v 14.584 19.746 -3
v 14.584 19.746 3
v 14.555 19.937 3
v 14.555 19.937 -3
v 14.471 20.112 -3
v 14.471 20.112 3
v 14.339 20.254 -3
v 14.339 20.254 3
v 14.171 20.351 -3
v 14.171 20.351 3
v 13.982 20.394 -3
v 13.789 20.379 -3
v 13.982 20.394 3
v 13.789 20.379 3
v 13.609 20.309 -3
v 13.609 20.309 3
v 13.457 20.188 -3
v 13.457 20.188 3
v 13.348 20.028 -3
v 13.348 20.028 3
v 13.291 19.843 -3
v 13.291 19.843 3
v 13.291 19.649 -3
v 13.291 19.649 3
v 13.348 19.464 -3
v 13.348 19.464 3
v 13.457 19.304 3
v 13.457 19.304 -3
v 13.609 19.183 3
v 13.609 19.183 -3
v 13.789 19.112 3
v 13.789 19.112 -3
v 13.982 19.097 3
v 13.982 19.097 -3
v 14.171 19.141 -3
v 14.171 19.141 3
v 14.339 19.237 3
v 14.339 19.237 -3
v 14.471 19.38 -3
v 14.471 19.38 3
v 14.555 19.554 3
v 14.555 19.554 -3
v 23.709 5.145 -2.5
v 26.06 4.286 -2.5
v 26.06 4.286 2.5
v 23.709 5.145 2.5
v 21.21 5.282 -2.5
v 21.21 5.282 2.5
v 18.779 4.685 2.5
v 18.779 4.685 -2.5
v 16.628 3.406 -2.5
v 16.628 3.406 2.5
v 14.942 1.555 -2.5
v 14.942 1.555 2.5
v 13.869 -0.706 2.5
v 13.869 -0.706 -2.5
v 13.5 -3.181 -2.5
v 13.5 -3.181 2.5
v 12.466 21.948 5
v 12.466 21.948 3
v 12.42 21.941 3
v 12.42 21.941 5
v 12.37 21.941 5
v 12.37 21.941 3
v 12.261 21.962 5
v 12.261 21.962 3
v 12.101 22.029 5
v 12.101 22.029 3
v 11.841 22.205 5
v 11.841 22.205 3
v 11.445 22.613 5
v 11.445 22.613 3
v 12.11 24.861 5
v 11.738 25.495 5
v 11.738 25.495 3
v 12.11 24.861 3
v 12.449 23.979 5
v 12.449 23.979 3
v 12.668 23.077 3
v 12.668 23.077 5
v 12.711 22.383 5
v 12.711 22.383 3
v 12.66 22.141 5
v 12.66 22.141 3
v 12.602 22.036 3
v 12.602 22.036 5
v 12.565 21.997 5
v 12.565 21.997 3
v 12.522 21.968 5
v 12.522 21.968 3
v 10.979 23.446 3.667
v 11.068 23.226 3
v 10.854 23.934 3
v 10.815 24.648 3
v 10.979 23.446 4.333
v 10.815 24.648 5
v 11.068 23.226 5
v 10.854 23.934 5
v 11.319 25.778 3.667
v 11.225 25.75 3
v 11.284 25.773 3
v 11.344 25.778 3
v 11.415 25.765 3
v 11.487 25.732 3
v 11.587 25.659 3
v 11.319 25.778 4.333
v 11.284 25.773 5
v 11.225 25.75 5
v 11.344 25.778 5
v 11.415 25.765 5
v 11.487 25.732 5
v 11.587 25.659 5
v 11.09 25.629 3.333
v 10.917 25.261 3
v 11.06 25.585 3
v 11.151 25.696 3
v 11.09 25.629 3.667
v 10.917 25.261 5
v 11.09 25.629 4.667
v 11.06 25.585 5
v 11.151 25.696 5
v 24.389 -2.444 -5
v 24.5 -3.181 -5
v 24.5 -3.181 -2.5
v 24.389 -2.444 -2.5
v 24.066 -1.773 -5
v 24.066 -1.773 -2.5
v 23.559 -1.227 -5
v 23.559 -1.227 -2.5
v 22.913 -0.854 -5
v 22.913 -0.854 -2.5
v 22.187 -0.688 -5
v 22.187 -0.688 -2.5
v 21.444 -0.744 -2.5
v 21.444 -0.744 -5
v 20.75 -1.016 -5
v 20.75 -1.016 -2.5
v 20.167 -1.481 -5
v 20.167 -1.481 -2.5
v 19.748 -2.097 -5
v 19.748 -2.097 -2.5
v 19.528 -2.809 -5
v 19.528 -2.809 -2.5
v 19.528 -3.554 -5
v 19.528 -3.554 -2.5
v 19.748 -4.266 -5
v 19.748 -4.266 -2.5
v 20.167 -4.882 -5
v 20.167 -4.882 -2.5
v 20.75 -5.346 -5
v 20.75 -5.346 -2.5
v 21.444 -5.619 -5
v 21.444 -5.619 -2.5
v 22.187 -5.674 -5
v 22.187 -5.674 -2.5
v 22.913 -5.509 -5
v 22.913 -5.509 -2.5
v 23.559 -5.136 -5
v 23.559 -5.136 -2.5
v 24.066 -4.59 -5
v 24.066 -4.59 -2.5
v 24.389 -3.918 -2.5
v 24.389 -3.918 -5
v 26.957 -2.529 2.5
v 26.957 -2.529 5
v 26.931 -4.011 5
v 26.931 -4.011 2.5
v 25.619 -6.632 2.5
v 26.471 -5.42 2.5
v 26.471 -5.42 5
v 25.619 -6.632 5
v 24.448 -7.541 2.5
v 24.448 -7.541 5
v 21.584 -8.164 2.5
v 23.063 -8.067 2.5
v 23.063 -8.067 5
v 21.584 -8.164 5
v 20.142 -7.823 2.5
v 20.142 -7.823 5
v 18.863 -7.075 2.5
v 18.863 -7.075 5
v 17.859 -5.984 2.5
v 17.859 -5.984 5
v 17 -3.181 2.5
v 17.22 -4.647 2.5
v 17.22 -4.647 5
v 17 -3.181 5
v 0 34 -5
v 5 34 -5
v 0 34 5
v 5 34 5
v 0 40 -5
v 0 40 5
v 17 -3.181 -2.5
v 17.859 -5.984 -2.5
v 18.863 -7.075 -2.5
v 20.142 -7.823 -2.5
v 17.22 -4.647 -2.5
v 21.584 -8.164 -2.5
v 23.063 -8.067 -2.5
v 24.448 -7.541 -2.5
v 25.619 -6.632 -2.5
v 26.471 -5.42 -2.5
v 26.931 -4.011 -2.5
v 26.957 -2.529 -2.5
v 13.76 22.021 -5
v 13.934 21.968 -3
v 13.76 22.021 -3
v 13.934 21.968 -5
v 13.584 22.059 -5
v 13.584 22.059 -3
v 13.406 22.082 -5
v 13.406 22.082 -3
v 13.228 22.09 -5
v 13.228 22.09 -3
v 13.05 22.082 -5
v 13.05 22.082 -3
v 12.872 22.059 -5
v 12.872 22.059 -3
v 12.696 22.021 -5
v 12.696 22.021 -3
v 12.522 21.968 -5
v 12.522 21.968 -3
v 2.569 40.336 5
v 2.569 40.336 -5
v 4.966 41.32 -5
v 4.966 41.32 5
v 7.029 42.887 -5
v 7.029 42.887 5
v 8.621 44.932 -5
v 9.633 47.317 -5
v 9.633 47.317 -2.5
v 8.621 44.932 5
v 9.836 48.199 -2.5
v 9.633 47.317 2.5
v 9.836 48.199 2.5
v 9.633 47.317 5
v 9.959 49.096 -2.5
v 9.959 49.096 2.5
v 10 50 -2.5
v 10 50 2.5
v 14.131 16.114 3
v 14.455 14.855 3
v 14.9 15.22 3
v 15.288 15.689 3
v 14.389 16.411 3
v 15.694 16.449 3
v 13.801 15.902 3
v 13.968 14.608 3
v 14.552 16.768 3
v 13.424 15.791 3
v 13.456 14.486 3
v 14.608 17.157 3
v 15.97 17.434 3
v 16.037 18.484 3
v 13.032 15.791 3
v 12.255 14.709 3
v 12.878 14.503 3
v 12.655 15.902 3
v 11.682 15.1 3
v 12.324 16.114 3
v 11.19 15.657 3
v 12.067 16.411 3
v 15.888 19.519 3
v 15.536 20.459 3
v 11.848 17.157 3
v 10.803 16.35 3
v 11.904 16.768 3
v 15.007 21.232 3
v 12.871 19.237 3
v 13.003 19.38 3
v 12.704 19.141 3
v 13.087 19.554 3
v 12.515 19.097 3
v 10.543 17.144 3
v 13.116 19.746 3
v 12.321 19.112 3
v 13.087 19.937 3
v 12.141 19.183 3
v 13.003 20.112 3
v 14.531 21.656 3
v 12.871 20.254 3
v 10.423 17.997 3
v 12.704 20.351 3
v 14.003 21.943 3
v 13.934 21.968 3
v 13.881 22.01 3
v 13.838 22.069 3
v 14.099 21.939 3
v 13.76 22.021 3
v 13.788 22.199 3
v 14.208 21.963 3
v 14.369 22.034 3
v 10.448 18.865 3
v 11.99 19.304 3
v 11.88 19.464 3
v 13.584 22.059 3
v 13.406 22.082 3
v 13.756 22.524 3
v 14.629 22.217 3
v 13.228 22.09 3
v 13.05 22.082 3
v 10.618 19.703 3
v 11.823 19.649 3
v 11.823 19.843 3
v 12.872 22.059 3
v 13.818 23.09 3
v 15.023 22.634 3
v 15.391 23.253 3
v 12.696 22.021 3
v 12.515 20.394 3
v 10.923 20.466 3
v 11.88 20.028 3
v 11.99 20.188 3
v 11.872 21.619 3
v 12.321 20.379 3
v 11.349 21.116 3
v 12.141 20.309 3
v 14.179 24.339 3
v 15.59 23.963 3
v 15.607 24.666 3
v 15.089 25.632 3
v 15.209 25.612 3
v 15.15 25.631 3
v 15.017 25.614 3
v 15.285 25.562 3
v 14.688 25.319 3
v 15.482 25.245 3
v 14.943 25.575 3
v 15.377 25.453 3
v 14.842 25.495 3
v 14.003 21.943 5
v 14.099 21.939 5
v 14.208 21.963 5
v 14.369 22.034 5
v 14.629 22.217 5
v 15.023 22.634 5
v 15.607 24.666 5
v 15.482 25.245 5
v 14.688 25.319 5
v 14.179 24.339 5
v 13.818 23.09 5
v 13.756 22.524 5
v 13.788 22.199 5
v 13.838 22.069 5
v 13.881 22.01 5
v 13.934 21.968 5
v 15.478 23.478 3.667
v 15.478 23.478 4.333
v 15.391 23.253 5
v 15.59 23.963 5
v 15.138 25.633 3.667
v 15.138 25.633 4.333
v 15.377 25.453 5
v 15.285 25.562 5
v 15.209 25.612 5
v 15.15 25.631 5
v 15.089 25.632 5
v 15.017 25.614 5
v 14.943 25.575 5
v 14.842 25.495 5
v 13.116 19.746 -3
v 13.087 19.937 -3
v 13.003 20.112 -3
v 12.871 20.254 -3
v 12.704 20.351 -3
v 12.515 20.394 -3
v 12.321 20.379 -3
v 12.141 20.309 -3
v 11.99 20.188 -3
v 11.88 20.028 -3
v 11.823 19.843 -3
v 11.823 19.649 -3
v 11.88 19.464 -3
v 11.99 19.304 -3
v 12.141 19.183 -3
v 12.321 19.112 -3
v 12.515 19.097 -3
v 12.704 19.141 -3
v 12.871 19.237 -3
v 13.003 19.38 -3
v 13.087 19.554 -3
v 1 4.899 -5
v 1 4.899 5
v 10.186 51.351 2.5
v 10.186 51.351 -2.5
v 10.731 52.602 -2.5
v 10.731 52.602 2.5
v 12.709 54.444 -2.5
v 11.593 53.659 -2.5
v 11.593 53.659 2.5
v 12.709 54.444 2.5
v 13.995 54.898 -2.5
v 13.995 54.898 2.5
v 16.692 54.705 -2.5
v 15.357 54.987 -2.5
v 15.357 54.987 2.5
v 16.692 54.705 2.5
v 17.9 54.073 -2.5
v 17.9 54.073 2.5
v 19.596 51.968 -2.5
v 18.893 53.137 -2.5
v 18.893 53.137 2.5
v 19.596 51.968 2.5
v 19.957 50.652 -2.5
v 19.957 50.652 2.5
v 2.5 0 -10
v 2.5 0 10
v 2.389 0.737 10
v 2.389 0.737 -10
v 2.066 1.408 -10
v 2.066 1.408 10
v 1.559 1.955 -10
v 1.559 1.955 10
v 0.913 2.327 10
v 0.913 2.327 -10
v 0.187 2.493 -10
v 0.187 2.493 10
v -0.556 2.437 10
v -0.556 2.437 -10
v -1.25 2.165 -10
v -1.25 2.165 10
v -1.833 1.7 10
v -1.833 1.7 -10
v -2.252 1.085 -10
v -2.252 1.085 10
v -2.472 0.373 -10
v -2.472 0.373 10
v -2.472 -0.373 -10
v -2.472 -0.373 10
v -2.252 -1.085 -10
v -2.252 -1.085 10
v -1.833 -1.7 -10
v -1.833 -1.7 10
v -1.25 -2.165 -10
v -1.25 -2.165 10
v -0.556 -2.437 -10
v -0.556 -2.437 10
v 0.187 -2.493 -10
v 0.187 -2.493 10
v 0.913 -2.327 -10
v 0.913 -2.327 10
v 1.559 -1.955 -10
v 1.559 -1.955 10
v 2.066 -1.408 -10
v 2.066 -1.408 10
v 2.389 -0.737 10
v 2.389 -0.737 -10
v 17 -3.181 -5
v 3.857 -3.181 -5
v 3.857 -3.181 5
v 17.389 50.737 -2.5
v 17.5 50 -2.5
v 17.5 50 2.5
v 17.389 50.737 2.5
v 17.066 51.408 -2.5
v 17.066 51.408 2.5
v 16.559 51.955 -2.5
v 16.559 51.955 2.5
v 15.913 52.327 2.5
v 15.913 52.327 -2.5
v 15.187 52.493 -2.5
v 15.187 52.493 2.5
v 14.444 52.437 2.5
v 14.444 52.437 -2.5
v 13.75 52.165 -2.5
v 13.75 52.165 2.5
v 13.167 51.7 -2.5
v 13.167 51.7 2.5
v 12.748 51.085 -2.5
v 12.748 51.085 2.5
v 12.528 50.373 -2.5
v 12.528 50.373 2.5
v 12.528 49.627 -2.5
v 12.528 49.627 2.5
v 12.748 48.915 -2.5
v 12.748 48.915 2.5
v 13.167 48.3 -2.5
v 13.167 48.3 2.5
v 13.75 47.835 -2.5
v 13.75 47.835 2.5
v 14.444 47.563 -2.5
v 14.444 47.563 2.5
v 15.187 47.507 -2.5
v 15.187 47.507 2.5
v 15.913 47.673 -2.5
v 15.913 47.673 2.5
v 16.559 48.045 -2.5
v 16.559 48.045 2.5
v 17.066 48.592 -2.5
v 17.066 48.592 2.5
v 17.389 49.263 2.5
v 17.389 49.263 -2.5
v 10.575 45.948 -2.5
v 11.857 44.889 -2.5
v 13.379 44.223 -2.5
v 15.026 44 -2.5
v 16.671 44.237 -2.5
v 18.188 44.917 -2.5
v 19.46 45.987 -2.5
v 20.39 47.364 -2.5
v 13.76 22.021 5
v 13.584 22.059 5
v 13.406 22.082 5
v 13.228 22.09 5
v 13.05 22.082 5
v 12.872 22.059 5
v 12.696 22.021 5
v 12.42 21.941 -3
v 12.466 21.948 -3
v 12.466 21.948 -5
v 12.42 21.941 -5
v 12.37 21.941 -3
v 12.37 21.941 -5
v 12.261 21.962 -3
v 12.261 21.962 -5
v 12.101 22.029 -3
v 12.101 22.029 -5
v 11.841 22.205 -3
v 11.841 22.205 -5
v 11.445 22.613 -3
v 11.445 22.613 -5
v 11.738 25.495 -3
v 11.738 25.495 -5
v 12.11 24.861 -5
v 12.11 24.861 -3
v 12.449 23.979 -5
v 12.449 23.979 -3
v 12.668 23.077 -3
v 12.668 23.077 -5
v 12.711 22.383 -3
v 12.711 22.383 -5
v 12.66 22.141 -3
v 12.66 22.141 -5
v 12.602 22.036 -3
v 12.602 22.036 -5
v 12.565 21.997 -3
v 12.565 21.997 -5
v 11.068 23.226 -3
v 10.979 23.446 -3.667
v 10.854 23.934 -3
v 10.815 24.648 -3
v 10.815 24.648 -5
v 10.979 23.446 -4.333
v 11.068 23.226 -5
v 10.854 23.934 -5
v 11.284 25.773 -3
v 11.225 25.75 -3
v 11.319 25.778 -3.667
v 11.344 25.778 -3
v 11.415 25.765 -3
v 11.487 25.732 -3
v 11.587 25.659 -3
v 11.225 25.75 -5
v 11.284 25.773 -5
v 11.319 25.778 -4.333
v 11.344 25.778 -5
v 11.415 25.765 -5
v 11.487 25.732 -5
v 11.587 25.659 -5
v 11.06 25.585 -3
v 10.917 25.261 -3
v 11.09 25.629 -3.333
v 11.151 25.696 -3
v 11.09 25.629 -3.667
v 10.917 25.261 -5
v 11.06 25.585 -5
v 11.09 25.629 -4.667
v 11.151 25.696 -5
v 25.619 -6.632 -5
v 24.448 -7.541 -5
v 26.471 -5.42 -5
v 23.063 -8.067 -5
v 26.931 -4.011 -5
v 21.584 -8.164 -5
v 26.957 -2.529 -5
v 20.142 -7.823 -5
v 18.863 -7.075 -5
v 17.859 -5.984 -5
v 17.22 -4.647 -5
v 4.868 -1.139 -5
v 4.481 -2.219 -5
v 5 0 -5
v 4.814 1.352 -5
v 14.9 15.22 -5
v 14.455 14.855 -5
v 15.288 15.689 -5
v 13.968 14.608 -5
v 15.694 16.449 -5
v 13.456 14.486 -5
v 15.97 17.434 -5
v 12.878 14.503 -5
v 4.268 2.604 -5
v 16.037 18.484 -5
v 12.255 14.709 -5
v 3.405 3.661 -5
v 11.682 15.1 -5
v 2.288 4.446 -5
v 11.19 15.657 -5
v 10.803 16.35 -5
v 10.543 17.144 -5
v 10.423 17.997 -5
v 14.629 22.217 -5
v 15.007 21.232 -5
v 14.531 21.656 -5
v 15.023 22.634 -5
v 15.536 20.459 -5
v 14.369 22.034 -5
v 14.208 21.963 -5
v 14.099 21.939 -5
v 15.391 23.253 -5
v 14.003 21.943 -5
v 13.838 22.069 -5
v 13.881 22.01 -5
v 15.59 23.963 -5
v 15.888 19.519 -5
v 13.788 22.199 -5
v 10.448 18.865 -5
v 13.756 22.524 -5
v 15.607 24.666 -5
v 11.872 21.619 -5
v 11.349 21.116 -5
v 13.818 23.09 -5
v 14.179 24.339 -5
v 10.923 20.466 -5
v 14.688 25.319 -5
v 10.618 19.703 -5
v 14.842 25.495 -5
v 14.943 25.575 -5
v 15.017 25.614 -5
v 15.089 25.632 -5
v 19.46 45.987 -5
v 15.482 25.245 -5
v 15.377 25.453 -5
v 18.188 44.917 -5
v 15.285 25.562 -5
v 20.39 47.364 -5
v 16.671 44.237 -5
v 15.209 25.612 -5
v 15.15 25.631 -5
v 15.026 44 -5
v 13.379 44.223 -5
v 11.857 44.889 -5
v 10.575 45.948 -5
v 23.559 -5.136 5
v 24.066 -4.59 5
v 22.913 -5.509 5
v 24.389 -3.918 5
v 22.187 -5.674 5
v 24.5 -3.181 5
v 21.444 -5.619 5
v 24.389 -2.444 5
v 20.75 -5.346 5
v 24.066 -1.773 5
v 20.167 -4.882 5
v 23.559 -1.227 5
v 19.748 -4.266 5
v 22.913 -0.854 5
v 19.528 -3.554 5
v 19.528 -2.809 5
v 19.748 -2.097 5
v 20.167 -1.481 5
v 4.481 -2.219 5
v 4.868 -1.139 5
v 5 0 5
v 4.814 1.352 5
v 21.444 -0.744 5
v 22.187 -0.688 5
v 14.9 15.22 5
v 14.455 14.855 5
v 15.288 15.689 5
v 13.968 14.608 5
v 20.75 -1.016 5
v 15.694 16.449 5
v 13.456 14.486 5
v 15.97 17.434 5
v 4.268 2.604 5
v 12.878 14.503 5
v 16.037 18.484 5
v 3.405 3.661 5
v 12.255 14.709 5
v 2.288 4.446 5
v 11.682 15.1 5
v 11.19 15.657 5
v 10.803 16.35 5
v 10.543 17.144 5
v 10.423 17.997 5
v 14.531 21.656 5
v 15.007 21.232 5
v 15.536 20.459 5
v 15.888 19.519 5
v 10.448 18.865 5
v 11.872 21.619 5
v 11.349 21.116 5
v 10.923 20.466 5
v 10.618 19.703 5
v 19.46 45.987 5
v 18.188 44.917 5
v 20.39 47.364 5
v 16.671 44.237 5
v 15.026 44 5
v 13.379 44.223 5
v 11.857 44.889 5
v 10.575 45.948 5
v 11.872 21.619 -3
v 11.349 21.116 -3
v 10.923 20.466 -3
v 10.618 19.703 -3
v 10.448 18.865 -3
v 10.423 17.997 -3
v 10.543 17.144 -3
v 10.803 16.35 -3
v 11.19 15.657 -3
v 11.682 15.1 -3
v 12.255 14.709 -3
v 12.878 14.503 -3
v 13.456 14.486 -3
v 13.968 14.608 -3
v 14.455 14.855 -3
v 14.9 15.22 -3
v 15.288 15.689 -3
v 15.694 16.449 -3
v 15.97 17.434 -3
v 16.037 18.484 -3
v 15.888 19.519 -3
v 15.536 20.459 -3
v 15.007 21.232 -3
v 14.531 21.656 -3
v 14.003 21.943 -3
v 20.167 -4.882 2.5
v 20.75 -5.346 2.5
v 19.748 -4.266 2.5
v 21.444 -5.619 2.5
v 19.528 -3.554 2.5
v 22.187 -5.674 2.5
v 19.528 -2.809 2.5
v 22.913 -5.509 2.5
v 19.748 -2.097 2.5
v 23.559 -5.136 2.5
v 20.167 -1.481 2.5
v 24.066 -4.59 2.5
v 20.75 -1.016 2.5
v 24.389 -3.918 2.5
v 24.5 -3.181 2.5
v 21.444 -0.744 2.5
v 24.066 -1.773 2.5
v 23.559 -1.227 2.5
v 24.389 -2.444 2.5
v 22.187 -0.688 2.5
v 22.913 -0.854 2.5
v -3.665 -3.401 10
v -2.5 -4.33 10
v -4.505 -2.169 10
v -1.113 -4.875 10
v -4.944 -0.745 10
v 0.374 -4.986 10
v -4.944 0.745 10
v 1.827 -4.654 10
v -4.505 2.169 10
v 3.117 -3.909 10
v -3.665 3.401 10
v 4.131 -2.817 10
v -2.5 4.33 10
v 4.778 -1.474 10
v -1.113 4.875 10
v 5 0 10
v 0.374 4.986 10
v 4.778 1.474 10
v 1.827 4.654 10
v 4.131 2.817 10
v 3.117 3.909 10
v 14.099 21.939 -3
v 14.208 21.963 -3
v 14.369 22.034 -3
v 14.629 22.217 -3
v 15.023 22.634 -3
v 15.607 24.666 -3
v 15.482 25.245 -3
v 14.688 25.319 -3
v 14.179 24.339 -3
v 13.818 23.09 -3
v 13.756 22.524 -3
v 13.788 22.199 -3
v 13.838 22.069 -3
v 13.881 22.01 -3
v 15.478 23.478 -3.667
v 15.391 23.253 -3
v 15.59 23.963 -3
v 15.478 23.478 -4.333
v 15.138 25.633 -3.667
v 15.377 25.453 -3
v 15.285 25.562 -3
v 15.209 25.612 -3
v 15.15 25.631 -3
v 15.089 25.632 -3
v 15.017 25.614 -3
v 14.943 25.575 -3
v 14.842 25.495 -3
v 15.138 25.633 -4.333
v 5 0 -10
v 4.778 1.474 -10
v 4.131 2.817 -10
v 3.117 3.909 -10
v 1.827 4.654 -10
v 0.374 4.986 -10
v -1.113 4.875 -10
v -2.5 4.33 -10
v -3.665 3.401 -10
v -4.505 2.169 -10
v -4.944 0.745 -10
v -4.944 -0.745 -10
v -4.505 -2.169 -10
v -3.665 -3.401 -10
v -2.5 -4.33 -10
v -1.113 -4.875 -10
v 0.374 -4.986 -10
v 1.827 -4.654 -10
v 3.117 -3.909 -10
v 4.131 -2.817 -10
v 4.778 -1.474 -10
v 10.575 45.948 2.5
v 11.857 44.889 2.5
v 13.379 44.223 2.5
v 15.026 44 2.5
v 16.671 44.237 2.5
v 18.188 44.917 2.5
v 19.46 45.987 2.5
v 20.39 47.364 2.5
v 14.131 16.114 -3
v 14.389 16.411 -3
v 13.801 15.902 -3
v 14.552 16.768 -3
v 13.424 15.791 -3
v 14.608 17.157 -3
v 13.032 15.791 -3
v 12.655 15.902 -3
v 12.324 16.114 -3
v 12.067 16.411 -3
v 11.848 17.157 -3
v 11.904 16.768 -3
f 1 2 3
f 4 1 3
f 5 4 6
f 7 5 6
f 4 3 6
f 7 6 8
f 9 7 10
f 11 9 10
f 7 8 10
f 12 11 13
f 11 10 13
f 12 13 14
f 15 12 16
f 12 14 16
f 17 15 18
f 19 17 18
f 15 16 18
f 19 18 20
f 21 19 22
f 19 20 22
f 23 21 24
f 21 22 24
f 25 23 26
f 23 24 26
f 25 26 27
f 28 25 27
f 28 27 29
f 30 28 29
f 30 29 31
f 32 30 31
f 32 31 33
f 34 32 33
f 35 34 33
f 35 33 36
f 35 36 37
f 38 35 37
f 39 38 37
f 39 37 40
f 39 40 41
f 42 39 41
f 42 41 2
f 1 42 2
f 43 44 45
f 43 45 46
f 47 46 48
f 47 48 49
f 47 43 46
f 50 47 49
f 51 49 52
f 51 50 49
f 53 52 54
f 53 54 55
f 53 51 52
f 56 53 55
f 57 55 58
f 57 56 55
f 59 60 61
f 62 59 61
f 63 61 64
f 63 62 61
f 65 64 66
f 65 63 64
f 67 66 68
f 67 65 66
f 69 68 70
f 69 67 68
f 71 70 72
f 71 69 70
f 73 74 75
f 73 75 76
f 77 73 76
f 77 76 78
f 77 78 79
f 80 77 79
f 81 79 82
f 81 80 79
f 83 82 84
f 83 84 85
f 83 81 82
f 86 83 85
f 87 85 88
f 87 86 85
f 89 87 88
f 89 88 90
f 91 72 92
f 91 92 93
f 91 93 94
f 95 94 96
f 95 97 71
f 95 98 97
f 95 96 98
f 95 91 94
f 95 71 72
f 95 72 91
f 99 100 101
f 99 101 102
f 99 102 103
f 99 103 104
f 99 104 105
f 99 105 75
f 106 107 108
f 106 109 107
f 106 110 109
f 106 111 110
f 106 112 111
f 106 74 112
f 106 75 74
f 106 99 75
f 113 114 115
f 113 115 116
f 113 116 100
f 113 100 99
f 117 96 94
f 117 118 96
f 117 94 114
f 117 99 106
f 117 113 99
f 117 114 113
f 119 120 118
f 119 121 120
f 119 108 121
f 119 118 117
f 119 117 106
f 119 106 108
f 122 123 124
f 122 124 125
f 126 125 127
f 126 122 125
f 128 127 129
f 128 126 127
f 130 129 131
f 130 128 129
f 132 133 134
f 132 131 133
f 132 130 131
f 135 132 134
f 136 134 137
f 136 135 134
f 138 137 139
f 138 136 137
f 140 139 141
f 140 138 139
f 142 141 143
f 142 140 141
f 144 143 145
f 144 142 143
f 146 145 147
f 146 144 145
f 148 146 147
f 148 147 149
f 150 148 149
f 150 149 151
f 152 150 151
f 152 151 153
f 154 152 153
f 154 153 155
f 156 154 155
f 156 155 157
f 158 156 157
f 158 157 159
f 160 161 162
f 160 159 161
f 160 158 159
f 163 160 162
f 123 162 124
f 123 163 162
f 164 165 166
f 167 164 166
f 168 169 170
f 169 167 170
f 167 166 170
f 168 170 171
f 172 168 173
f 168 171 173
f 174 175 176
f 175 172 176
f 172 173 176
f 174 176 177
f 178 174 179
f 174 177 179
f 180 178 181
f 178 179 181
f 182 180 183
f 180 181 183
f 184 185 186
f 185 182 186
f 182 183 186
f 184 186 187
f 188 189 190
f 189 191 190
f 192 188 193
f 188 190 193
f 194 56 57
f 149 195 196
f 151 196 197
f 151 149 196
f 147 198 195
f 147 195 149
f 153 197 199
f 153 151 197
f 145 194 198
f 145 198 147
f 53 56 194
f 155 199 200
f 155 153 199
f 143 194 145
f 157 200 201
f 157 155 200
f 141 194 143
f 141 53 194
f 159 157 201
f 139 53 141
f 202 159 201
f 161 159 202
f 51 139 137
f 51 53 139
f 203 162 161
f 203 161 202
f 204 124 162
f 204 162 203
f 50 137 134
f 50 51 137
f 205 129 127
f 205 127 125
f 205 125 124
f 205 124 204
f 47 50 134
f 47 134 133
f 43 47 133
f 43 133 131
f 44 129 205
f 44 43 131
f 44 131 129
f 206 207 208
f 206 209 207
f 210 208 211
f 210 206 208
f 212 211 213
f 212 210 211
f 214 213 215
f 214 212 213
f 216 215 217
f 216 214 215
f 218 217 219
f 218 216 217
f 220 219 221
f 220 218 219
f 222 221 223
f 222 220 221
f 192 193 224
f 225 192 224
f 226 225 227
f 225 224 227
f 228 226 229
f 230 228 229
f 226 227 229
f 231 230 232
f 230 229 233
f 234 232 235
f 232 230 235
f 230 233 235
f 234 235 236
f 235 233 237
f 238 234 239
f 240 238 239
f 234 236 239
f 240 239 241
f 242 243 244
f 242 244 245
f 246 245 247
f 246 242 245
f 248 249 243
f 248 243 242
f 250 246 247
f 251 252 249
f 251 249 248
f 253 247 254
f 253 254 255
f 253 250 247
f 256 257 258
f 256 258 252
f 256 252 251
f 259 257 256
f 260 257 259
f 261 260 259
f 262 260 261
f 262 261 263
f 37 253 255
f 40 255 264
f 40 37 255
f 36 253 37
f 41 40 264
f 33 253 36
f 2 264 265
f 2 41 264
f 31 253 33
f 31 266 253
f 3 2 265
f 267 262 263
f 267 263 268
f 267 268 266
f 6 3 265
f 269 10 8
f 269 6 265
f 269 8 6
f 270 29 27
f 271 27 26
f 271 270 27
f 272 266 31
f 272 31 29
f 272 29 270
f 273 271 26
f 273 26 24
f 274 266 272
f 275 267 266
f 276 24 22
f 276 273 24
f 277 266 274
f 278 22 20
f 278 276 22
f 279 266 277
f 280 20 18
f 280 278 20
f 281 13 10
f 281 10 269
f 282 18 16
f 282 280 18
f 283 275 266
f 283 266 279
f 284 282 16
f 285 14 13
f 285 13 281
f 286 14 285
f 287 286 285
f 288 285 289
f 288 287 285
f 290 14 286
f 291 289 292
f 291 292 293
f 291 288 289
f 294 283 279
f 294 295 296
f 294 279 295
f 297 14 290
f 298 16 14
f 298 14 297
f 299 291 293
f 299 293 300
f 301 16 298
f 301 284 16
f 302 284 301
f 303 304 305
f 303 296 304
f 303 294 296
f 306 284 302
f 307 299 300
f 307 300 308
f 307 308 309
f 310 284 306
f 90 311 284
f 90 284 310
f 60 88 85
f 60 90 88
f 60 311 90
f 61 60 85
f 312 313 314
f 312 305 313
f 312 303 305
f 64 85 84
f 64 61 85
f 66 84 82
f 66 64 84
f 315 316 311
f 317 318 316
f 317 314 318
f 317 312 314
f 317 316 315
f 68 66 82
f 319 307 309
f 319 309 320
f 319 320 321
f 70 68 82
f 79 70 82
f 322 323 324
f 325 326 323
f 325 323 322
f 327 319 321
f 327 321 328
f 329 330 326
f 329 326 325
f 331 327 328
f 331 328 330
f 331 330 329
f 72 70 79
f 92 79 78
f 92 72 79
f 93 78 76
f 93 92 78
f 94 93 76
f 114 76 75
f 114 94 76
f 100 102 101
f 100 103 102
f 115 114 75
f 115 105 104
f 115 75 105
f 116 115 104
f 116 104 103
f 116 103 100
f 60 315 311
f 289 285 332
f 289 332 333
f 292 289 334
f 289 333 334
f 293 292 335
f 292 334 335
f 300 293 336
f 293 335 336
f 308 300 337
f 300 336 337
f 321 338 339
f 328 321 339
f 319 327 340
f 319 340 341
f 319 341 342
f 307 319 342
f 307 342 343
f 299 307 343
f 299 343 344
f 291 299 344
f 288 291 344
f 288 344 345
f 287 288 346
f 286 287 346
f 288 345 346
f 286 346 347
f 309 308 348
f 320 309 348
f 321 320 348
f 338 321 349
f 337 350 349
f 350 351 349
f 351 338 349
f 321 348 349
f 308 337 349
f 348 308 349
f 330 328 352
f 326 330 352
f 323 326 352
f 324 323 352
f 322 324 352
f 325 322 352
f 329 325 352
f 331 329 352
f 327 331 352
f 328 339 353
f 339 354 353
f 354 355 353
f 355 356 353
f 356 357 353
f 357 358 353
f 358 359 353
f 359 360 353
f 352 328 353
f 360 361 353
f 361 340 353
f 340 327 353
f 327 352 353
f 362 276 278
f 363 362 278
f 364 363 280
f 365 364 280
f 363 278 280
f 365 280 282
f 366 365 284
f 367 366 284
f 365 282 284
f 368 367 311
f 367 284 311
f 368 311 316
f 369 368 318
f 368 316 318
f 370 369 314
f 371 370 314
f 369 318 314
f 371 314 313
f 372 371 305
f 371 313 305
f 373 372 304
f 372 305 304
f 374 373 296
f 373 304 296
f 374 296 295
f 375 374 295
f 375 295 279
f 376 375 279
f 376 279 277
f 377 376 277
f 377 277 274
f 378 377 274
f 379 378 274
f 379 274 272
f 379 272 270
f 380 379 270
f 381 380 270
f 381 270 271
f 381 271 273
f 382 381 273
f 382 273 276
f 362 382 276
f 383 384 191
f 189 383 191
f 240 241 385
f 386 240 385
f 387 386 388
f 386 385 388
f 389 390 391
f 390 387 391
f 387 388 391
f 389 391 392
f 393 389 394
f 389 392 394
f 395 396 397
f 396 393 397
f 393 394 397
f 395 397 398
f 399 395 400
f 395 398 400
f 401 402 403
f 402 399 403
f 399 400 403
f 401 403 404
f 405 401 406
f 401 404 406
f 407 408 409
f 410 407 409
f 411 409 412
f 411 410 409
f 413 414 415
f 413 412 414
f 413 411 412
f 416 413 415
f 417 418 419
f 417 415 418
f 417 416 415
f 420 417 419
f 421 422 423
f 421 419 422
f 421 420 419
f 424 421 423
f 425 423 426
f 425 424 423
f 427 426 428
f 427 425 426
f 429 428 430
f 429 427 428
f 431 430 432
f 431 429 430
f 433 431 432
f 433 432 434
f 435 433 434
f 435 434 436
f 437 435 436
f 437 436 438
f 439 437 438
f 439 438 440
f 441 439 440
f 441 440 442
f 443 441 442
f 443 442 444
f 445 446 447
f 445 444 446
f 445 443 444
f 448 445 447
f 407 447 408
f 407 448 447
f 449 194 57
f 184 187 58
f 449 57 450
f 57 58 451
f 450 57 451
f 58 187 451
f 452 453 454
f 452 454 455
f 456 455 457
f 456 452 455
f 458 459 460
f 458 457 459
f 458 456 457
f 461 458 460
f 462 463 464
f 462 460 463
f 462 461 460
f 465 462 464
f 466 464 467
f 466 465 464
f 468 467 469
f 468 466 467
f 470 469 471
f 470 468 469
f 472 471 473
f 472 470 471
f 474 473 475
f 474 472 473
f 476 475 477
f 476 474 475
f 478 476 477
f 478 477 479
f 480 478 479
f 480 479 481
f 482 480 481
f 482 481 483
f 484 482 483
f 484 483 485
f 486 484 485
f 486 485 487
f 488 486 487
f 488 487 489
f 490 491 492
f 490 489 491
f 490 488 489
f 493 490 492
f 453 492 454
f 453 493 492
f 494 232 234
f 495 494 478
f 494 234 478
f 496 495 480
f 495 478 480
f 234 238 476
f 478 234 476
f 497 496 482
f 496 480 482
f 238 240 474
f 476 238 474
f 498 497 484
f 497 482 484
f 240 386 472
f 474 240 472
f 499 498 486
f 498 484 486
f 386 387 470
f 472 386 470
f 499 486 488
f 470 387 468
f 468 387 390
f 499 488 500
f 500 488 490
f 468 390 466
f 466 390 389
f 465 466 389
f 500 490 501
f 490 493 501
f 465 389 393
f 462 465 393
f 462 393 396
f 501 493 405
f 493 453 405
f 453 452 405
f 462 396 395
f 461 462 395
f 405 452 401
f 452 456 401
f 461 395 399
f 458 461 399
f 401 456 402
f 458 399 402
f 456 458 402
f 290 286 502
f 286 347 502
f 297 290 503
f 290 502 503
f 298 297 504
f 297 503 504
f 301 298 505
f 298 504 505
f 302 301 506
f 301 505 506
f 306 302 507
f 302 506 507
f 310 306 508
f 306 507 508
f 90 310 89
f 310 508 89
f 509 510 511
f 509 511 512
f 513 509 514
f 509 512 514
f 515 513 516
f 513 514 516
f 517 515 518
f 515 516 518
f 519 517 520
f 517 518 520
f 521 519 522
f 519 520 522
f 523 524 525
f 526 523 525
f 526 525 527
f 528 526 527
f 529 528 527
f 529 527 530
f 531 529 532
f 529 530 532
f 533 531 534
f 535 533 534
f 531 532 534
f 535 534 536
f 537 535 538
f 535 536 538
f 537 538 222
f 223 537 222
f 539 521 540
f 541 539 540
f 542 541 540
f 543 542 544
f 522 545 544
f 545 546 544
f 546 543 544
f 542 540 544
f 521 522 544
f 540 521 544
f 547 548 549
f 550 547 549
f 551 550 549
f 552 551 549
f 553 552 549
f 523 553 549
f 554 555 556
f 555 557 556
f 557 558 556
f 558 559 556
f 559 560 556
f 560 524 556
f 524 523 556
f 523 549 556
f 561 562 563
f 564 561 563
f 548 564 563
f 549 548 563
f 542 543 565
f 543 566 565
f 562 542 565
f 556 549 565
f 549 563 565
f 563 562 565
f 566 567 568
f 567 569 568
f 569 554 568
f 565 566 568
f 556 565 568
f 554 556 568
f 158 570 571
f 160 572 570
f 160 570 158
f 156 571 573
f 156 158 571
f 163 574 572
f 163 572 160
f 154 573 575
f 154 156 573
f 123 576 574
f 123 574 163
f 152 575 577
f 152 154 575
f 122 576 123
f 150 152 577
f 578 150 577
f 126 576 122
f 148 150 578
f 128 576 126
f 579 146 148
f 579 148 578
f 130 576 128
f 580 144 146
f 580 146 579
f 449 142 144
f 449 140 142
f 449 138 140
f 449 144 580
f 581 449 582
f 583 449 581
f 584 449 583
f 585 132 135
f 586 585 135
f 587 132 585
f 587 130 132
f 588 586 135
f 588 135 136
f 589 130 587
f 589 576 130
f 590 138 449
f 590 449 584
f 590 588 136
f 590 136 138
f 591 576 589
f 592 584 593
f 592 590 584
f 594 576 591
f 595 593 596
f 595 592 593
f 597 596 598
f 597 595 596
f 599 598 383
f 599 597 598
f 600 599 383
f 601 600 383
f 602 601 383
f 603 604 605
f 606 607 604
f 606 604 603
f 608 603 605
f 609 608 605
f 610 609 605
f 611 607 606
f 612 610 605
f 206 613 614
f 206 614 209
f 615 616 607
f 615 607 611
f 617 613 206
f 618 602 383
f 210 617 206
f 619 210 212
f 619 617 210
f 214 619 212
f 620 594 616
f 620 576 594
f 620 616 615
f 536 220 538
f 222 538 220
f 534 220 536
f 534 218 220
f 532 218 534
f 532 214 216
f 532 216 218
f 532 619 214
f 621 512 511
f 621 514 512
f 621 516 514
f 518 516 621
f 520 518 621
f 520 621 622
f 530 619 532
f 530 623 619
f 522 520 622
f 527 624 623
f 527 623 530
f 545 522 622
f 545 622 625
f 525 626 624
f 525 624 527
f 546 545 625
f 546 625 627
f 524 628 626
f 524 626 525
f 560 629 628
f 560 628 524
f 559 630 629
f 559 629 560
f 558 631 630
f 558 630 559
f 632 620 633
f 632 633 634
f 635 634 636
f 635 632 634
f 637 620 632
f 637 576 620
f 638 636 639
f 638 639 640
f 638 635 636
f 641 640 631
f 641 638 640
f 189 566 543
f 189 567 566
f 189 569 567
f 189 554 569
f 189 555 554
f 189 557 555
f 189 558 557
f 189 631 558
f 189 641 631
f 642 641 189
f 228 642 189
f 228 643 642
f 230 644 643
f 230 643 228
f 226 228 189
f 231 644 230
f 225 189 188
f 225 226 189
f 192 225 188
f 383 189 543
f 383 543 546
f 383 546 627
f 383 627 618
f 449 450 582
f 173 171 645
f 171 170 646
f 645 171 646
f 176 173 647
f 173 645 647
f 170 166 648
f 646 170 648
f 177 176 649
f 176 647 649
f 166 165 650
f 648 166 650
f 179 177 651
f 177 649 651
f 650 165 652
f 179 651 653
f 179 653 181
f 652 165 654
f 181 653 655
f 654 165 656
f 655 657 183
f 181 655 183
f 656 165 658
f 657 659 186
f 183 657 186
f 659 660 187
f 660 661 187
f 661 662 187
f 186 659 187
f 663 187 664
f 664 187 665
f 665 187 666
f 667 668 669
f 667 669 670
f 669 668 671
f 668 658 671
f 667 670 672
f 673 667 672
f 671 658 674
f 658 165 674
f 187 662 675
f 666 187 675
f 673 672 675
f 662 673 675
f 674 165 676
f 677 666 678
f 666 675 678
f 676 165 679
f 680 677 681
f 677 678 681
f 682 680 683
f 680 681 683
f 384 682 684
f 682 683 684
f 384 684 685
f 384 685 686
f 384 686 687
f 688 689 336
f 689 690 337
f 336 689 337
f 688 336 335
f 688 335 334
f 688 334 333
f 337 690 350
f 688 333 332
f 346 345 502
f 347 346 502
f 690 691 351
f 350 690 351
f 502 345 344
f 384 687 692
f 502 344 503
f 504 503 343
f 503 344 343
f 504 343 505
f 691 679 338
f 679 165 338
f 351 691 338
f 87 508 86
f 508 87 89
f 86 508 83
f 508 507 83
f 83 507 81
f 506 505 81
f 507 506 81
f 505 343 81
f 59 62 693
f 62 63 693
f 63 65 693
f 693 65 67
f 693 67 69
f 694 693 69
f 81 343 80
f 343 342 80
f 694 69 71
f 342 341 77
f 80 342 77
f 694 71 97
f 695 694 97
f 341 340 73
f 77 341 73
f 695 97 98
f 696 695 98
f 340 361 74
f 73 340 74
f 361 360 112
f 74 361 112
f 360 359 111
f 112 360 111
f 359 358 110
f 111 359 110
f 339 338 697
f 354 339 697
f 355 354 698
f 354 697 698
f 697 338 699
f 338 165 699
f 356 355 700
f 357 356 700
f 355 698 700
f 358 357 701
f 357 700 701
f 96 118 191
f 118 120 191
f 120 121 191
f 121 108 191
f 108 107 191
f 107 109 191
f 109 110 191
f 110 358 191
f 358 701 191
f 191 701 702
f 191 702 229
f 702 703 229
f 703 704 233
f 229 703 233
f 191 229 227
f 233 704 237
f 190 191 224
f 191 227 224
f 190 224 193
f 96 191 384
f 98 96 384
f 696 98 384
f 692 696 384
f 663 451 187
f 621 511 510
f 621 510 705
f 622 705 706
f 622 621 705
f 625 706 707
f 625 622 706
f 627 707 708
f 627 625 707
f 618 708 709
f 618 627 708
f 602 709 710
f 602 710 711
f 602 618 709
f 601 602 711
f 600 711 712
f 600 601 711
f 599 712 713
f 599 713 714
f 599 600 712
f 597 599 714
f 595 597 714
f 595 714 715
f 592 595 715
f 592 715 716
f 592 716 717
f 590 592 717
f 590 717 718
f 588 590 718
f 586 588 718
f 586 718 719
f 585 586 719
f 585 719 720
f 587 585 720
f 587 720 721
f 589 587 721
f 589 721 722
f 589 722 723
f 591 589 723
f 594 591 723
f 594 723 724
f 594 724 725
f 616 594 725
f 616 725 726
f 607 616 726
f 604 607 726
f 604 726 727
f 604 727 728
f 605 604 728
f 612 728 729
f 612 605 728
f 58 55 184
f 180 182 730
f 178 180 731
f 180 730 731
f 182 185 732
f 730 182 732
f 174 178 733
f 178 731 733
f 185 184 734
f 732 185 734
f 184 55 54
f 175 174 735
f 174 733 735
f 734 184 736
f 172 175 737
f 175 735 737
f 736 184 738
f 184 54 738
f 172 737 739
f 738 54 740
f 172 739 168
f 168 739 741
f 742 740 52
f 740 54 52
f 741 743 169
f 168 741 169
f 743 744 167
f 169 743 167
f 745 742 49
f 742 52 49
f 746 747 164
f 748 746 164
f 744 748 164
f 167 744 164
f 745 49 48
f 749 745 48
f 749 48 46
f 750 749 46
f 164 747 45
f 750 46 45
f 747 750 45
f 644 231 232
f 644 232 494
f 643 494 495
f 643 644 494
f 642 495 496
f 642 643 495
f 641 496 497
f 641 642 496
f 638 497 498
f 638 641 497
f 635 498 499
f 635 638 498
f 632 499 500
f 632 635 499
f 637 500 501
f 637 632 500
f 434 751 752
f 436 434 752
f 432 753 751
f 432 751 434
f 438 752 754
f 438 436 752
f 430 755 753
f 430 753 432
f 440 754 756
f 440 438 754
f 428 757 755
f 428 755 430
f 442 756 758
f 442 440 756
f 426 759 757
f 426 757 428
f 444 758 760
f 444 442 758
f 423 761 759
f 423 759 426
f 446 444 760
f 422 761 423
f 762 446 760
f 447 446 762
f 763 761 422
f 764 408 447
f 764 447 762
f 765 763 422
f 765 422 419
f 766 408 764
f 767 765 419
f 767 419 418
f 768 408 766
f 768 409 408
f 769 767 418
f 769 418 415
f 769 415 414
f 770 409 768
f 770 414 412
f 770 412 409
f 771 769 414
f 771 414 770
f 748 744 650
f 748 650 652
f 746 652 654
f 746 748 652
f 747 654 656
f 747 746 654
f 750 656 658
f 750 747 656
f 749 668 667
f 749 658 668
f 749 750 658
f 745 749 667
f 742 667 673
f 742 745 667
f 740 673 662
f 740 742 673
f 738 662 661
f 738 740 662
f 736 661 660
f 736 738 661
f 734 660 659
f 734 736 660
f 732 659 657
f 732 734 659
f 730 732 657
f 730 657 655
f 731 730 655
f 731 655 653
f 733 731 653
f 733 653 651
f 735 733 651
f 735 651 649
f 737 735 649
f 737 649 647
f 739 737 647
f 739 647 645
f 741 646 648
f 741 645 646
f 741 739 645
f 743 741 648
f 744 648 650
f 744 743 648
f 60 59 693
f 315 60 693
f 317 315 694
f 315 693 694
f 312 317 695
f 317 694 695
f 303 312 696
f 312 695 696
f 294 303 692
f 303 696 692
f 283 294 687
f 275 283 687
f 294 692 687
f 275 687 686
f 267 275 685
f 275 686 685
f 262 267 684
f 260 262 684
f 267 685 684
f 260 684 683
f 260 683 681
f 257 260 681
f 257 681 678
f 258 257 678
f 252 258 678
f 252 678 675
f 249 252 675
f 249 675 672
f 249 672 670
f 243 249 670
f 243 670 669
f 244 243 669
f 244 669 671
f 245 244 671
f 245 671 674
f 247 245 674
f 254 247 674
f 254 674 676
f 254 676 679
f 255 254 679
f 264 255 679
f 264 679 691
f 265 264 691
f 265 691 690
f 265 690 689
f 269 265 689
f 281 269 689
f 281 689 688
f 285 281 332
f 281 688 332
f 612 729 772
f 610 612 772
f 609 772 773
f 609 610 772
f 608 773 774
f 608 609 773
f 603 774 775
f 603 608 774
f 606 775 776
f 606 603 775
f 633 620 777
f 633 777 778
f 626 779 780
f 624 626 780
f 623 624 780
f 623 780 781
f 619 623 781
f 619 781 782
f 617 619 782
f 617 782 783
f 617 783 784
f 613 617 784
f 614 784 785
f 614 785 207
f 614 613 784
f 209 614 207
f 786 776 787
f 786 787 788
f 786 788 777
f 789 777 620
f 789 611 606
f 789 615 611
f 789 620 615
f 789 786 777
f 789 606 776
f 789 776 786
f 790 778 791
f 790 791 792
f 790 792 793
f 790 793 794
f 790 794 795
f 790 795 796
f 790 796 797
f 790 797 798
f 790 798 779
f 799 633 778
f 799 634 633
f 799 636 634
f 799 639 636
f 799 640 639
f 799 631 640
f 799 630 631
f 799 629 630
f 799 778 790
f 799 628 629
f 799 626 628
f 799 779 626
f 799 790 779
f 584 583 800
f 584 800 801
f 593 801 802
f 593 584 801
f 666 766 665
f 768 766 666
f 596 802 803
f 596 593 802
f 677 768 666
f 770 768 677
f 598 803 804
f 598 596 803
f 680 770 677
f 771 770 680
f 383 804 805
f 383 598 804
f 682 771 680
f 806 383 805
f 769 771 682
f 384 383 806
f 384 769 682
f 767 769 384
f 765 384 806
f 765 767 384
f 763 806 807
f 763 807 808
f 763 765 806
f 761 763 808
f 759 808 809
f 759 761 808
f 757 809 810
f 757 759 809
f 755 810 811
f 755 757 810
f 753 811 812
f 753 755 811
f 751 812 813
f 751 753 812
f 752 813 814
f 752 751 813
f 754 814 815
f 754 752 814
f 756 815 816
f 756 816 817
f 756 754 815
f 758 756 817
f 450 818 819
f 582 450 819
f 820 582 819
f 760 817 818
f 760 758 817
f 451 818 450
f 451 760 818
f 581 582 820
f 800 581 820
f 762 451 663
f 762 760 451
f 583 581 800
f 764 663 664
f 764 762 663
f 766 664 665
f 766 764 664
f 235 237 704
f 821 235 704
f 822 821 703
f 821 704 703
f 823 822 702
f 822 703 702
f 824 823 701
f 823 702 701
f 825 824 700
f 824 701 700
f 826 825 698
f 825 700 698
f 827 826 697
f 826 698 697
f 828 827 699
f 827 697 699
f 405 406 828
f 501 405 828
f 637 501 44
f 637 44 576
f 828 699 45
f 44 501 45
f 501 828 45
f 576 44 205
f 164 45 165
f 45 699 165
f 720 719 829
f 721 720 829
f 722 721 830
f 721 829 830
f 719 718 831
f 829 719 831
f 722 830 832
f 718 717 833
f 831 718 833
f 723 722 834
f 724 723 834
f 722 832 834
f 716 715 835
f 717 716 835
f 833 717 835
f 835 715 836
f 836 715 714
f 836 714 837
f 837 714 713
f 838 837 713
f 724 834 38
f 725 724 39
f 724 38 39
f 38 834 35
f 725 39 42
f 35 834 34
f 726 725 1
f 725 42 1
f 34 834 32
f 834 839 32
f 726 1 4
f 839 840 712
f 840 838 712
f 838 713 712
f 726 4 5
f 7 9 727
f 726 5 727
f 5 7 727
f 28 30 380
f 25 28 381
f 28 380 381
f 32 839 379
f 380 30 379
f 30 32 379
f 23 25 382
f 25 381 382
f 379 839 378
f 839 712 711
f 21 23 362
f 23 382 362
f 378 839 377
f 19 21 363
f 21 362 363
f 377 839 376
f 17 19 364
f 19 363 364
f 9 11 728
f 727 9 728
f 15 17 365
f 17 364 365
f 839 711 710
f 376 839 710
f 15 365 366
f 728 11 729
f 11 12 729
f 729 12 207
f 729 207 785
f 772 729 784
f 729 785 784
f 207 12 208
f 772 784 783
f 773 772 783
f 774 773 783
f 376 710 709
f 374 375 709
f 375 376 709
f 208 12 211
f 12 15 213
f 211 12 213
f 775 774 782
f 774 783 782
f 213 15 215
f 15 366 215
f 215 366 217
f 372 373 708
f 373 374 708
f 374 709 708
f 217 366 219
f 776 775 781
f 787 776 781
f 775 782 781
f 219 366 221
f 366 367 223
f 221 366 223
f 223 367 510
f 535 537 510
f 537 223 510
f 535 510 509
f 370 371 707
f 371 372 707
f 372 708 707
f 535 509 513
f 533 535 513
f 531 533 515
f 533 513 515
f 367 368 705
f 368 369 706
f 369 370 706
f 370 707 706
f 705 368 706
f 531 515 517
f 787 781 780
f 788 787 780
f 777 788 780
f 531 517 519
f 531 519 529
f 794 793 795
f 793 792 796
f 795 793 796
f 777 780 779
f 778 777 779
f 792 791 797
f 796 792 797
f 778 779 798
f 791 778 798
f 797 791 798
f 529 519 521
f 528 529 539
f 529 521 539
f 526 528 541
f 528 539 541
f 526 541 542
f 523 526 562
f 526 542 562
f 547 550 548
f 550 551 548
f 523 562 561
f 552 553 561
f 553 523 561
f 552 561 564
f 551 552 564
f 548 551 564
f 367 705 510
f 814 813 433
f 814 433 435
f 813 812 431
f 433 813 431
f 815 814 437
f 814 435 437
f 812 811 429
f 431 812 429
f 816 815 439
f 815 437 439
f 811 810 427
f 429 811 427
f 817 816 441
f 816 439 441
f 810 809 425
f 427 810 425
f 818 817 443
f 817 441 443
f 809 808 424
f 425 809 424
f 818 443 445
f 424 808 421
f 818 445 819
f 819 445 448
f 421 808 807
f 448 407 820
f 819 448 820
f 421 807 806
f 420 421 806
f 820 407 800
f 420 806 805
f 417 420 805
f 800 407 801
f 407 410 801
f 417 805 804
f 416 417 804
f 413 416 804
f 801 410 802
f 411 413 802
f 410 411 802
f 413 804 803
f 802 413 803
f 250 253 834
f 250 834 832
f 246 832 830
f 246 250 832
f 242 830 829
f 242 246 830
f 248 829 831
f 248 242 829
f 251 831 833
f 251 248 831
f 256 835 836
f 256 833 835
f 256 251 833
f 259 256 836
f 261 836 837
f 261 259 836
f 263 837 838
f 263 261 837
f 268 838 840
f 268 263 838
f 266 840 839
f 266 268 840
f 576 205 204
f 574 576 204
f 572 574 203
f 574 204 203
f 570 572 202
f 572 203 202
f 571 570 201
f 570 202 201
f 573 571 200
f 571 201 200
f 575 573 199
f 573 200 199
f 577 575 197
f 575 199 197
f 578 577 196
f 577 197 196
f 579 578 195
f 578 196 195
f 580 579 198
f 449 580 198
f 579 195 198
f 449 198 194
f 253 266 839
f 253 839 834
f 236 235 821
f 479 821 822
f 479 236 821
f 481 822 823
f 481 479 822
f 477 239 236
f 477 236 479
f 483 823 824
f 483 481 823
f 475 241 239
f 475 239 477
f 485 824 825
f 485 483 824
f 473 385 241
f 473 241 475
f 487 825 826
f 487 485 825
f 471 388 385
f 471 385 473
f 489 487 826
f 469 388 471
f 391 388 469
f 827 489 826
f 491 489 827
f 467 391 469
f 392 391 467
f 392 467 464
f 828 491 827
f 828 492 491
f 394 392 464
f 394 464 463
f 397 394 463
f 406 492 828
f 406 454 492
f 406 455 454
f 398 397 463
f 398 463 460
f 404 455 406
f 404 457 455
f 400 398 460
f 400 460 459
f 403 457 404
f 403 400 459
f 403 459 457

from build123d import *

# Parameters (mm, degrees)
SKETCH2_R               = 5
BOSS_EXTRUDE1_DEPTH     = 10
BOSS_EXTRUDE2_DEPTH     = 5
CUT_EXTRUDE1_DEPTH      = 64.079315152
CUT_EXTRUDE1_DEPTH_BACK = 64.079315152
SKETCH4_R               = 2.5
SKETCH5_R               = 6
CUT_EXTRUDE2_DEPTH      = 2.5
CUT_EXTRUDE3_DEPTH      = 2.5
CUT_EXTRUDE3_DEPTH_BACK = 2.5
SKETCH7_R               = 8.5
SKETCH9_RX              = 3.80806065
SKETCH9_RY              = 2.813161922
CUT_EXTRUDE4_DEPTH      = 2
CUT_EXTRUDE5_DEPTH      = 2
SKETCH12_R              = 0.65
CUT_EXTRUDE6_DEPTH      = 63.633856702
CUT_EXTRUDE7_DEPTH      = 63.633856702


with BuildPart() as part:
    # Sketch2 → Boss-Extrude1 (new, symmetric)
    with BuildSketch(Plane.XY):
        Circle(SKETCH2_R)
    extrude(amount=BOSS_EXTRUDE1_DEPTH, both=True)

    # Sketch3 → Boss-Extrude2 (add, symmetric)
    with BuildSketch(Plane.XY):
        with BuildLine():
            Line((1, 4.898979486), (5, 34))
            Line((5, 34), (0, 34))
            Line((0, 34), (0, 40))
            ThreePointArc((0, 40), (7.071067812, 42.928932188), (10, 50))
            ThreePointArc((10, 50), (14.673051661, 54.989299027), (19.957241913, 50.652497212))
            Line((19.957241913, 50.652497212), (26.957241913, -2.528869287))
            ThreePointArc((26.957241913, -2.528869287), (22.326948339, -8.170665526), (17, -3.181366499))
            Line((17, -3.181366499), (3.857318654, -3.181366499))
            Line((3.857318654, -3.181366499), (1, 4.898979486))
        make_face()
    extrude(amount=BOSS_EXTRUDE2_DEPTH, both=True)

    # Sketch4 → Cut-Extrude1 (cut, two sides: drawn at the far end of the back side and taken through both)
    with BuildSketch(Plane.XY.offset(5).offset(-CUT_EXTRUDE1_DEPTH_BACK)):
        with Locations((15, 50)):
            Circle(SKETCH4_R)
        Circle(SKETCH4_R)
        with Locations((22, -3.181366499)):
            Circle(SKETCH4_R)
    extrude(amount=CUT_EXTRUDE1_DEPTH + CUT_EXTRUDE1_DEPTH_BACK, mode=Mode.SUBTRACT)

    # Sketch5 → Cut-Extrude2 (cut)
    with BuildSketch(Plane.XY.offset(5)):
        with Locations((15, 50)):
            Circle(SKETCH5_R)
    cut_extrude2 = extrude(amount=-CUT_EXTRUDE2_DEPTH, mode=Mode.SUBTRACT)

    # Mirror1: Cut-Extrude2 across plane
    add(cut_extrude2.mirror(Plane.XY), mode=Mode.SUBTRACT)

    # Sketch7 → Cut-Extrude3 (cut, two sides: drawn at the far end of the back side and taken through both)
    with BuildSketch(Plane.XY.offset(-CUT_EXTRUDE3_DEPTH_BACK)):
        with Locations((22, -3.181366499)):
            Circle(SKETCH7_R)
    extrude(amount=CUT_EXTRUDE3_DEPTH + CUT_EXTRUDE3_DEPTH_BACK, mode=Mode.SUBTRACT)

    # Sketch9 → Cut-Extrude4 (cut)
    with BuildSketch(Plane.XY.offset(5)):
        with Locations(Location((13.227873683, 18.281882493), (0, 0, 90))):
            Ellipse(SKETCH9_RX, SKETCH9_RY)
    cut_extrude4 = extrude(amount=-CUT_EXTRUDE4_DEPTH, mode=Mode.SUBTRACT)

    # Sketch11 → Cut-Extrude5 (cut)
    with BuildSketch(Plane.XY.offset(5)):
        with BuildLine():
            add(Edge.make_bspline(
                [(12.522028797, 21.968126834), (12.172187814, 21.786407618), (10.359411342, 23.317925648), (11.369156283, 27.907682858), (13.176267664, 22.307960587), (12.522028797, 21.968126834)],
                knots=[0, 0, 0, 0, 0.25167876, 0.529334656, 1, 1, 1, 1], degree=3))
        make_face()
        with BuildLine():
            add(Edge.make_bspline(
                [(13.933718568, 21.968126834), (14.276902775, 21.772094059), (16.056700712, 23.2943812), (15.069290945, 27.627740223), (13.320756239, 22.318261556), (13.933718568, 21.968126834)],
                knots=[0, 0, 0, 0, 0.263421901, 0.529501361, 1, 1, 1, 1], degree=3))
        make_face()
    cut_extrude5 = extrude(amount=-CUT_EXTRUDE5_DEPTH, mode=Mode.SUBTRACT)

    # Sketch12 → Cut-Extrude6 (cut, through all)
    with BuildSketch(Plane.XY.offset(3)):
        with Locations((12.466071171, 19.745676536)):
            Circle(SKETCH12_R)
        with Locations((13.933718568, 19.745676536)):
            Circle(SKETCH12_R)
    extrude(amount=-CUT_EXTRUDE6_DEPTH, mode=Mode.SUBTRACT)

    # Sketch13 → Cut-Extrude7 (cut, through all)
    with BuildSketch(Plane.XY.offset(3)):
        with BuildLine():
            Line((11.848135132, 17.156912107), (14.607612233, 17.156912107))
            ThreePointArc((14.607612233, 17.156912107), (13.227873683, 15.777173557), (11.848135132, 17.156912107))
        make_face()
    extrude(amount=-CUT_EXTRUDE7_DEPTH, mode=Mode.SUBTRACT)

    # Mirror2: Cut-Extrude4, Cut-Extrude5 across plane
    add(cut_extrude4.mirror(Plane.XY), mode=Mode.SUBTRACT)
    add(cut_extrude5.mirror(Plane.XY), mode=Mode.SUBTRACT)


solid = part.part
